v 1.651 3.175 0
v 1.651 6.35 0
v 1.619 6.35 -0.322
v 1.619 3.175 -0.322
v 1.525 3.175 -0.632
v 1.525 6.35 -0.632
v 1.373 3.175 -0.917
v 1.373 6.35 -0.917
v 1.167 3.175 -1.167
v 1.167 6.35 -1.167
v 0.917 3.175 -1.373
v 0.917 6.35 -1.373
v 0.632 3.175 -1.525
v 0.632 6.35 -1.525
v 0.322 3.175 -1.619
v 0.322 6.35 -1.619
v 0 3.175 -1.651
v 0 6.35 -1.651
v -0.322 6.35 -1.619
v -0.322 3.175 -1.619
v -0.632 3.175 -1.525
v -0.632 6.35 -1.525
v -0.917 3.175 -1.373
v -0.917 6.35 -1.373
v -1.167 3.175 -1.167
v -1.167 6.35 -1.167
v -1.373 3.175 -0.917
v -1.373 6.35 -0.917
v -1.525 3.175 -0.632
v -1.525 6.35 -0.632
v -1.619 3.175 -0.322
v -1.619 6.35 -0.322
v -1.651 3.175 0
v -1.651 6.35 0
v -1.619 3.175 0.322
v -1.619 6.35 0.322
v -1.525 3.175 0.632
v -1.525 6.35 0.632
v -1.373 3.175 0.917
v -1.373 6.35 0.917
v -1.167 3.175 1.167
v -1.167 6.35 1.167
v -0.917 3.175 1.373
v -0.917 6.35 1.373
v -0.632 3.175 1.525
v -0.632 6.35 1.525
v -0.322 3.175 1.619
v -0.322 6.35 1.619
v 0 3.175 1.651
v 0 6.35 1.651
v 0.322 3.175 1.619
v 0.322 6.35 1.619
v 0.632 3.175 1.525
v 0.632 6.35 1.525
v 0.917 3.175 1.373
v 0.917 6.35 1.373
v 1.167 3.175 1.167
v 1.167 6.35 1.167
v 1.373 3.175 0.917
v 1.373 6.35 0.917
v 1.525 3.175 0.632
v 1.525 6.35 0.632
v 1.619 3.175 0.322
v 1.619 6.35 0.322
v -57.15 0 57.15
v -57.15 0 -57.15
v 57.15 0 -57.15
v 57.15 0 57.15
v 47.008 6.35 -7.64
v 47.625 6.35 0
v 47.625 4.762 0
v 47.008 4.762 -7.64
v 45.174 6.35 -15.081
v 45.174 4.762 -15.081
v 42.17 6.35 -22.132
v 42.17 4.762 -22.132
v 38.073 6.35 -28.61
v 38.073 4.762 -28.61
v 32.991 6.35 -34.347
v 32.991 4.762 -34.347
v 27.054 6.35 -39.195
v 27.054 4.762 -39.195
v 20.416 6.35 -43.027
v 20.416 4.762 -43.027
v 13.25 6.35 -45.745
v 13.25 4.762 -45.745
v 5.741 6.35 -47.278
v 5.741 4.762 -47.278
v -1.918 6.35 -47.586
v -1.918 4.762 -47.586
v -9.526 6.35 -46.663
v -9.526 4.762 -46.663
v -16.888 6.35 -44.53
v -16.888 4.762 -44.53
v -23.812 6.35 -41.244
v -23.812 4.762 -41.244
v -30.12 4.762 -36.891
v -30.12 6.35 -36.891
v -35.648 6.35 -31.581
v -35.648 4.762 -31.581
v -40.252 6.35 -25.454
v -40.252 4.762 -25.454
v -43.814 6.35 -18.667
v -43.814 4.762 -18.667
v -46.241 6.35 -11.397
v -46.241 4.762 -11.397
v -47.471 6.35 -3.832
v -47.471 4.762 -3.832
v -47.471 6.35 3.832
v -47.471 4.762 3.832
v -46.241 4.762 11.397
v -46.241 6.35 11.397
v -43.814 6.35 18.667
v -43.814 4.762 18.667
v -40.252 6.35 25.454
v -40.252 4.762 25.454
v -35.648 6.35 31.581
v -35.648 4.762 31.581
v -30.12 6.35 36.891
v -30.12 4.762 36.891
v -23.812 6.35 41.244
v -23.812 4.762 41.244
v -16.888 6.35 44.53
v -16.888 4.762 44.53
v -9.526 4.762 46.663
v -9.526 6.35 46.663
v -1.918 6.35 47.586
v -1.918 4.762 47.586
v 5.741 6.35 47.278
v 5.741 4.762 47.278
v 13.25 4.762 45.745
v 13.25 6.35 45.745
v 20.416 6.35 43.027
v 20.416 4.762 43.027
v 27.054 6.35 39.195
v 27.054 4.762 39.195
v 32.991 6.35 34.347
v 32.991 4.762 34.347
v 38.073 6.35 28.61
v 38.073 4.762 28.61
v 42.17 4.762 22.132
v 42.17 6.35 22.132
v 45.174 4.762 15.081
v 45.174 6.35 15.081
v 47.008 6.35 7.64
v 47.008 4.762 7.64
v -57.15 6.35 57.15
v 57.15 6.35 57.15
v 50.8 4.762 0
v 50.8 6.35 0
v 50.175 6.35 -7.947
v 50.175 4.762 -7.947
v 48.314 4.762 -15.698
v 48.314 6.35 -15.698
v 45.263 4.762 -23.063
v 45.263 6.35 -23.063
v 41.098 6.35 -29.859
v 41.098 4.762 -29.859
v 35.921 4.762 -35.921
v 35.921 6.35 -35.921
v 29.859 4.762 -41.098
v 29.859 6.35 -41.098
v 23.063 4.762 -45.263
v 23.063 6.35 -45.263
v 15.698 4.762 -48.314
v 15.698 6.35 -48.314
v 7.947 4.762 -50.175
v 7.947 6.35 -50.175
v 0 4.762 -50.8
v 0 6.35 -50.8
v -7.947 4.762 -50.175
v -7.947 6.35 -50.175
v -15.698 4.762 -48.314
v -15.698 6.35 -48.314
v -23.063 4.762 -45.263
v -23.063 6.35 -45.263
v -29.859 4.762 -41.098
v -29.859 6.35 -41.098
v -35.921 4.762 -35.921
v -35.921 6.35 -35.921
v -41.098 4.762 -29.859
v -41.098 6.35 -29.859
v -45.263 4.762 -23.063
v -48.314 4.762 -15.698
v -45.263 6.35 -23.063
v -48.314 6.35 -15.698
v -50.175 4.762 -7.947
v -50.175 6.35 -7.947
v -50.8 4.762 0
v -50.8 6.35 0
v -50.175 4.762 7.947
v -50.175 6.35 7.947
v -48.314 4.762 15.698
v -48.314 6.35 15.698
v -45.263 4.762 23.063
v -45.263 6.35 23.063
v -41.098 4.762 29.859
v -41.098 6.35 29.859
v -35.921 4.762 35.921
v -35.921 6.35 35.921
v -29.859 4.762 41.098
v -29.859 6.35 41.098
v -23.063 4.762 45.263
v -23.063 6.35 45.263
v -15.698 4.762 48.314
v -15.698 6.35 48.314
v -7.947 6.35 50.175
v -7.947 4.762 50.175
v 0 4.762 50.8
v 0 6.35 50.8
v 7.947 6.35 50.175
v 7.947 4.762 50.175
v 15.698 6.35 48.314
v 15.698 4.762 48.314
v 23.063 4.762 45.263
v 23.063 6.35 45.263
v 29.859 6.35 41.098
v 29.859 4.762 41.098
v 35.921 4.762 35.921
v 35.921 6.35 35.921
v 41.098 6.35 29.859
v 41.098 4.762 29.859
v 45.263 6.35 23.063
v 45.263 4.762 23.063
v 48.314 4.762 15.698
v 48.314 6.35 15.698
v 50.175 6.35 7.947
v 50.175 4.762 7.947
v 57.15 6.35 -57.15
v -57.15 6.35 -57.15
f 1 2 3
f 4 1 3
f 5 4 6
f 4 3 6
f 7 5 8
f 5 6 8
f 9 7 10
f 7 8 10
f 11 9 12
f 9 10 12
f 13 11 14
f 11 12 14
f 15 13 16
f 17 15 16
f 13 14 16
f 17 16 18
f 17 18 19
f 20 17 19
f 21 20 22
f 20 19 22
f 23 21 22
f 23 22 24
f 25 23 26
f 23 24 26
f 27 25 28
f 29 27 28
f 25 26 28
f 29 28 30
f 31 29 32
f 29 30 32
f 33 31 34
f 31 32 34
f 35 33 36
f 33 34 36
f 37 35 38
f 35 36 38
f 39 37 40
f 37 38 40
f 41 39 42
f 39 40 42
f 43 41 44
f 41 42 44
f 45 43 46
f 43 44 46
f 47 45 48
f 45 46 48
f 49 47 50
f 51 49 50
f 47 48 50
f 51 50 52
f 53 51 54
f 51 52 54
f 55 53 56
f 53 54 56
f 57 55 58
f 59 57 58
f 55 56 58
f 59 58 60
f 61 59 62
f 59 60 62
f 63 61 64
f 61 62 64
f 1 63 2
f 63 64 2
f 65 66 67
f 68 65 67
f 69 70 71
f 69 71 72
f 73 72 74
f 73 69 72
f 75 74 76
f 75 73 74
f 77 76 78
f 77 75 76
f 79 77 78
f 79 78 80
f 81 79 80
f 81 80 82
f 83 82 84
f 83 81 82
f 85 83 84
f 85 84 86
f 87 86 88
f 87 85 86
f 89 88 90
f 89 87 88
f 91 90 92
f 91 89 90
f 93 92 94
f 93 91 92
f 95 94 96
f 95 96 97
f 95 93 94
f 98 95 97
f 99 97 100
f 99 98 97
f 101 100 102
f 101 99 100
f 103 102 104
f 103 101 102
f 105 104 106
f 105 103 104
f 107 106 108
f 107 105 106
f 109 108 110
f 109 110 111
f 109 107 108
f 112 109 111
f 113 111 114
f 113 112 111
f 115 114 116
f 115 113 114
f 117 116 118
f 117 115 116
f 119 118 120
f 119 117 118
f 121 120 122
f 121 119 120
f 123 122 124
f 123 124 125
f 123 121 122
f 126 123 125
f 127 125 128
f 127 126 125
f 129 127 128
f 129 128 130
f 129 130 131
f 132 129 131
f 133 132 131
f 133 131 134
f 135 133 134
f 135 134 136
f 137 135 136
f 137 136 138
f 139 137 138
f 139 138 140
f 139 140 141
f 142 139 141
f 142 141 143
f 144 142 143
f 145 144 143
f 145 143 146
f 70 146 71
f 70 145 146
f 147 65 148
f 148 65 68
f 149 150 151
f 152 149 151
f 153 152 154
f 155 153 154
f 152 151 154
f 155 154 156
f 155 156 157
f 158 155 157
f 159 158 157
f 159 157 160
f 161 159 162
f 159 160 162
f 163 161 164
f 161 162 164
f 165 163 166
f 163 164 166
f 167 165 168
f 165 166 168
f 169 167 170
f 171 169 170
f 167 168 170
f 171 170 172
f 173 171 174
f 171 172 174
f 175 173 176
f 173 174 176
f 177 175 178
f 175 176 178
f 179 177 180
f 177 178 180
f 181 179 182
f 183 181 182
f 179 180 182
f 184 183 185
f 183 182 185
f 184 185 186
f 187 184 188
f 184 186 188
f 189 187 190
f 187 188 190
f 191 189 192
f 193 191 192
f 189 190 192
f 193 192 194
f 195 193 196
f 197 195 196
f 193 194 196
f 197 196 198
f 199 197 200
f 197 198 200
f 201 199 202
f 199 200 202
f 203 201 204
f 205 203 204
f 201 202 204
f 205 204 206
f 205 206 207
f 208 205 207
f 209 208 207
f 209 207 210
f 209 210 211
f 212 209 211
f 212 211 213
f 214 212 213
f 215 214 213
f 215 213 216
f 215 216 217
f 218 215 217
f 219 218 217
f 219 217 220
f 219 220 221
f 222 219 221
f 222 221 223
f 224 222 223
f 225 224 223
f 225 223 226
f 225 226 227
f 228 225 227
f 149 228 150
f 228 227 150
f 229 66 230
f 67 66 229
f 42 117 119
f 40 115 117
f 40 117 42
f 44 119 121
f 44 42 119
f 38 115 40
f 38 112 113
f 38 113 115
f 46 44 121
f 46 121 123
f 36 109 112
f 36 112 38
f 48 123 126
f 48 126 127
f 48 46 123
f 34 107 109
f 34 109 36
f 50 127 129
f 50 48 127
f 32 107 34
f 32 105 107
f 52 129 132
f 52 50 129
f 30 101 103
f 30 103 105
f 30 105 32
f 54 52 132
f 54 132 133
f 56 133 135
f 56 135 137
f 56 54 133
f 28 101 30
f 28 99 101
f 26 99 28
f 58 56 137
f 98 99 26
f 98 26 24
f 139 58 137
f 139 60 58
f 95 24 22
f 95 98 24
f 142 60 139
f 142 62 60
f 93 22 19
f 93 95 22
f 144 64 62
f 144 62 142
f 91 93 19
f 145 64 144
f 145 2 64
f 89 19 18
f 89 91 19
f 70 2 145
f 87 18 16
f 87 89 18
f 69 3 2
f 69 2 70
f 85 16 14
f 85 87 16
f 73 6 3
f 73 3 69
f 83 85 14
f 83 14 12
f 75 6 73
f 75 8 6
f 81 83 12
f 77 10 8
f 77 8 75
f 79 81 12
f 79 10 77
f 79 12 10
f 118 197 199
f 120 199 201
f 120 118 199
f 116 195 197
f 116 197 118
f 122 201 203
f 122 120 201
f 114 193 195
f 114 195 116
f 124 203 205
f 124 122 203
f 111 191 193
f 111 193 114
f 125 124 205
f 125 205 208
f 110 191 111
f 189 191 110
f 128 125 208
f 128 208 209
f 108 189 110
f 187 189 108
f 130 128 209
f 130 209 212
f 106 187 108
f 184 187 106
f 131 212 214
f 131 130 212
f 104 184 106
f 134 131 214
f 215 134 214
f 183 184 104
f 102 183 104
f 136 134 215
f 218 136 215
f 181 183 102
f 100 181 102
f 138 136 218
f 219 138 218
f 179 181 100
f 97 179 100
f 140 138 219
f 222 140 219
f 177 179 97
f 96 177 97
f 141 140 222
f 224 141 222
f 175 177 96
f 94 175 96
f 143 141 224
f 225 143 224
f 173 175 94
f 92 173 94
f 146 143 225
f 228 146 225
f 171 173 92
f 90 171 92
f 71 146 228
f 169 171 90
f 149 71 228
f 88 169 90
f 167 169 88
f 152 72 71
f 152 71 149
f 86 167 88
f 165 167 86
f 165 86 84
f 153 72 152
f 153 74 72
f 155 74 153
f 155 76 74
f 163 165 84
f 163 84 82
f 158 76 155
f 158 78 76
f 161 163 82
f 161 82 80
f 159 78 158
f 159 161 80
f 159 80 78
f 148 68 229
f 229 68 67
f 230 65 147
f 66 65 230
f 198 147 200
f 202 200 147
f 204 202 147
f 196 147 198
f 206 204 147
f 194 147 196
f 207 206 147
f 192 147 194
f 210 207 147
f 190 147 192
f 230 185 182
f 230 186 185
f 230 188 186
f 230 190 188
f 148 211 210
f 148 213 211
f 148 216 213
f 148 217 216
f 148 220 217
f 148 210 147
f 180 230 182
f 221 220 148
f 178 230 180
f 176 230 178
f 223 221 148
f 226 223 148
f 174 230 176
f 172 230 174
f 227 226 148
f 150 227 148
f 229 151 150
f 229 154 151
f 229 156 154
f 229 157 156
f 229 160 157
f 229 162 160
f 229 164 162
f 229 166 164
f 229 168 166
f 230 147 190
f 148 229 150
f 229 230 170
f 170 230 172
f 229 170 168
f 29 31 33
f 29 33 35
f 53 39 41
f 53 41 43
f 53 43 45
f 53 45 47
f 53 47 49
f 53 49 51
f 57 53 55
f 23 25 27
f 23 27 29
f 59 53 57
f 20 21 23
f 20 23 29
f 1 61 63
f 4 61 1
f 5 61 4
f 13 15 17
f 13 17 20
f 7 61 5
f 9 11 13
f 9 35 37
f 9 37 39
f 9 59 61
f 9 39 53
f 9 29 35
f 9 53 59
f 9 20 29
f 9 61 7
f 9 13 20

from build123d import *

# Parameters (mm, degrees)
SKETCH1_W               = 114.3
SKETCH1_H               = 114.3
BOSS_EXTRUDE1_DEPTH     = 6.35
SKETCH2_R               = 50.8
SKETCH2_R_2             = 47.625
CUT_EXTRUDE_THIN1_DEPTH = 1.5875
SKETCH3_R               = 1.651
CUT_EXTRUDE1_DEPTH      = 3.175


with BuildPart() as part:
    # Sketch1 → Boss-Extrude1 (new body)
    with BuildSketch(Plane(origin=(0, 0, 0), x_dir=(1, 0, 0), z_dir=(0, 1, 0))):
        Rectangle(SKETCH1_W, SKETCH1_H)
    extrude(amount=BOSS_EXTRUDE1_DEPTH)

    # Sketch2 → Cut-Extrude-Thin1 (cut)
    with BuildSketch(Plane(origin=(0, 6.35, 0), x_dir=(1, 0, 0), z_dir=(0, 1, 0))):
        Circle(SKETCH2_R)
        Circle(SKETCH2_R_2, mode=Mode.SUBTRACT)
    extrude(amount=-CUT_EXTRUDE_THIN1_DEPTH, mode=Mode.SUBTRACT)

    # Sketch3 → Cut-Extrude1 (cut)
    with BuildSketch(Plane(origin=(0, 6.35, 0), x_dir=(1, 0, 0), z_dir=(0, 1, 0))):
        Circle(SKETCH3_R)
    extrude(amount=-CUT_EXTRUDE1_DEPTH, mode=Mode.SUBTRACT)


solid = part.part
